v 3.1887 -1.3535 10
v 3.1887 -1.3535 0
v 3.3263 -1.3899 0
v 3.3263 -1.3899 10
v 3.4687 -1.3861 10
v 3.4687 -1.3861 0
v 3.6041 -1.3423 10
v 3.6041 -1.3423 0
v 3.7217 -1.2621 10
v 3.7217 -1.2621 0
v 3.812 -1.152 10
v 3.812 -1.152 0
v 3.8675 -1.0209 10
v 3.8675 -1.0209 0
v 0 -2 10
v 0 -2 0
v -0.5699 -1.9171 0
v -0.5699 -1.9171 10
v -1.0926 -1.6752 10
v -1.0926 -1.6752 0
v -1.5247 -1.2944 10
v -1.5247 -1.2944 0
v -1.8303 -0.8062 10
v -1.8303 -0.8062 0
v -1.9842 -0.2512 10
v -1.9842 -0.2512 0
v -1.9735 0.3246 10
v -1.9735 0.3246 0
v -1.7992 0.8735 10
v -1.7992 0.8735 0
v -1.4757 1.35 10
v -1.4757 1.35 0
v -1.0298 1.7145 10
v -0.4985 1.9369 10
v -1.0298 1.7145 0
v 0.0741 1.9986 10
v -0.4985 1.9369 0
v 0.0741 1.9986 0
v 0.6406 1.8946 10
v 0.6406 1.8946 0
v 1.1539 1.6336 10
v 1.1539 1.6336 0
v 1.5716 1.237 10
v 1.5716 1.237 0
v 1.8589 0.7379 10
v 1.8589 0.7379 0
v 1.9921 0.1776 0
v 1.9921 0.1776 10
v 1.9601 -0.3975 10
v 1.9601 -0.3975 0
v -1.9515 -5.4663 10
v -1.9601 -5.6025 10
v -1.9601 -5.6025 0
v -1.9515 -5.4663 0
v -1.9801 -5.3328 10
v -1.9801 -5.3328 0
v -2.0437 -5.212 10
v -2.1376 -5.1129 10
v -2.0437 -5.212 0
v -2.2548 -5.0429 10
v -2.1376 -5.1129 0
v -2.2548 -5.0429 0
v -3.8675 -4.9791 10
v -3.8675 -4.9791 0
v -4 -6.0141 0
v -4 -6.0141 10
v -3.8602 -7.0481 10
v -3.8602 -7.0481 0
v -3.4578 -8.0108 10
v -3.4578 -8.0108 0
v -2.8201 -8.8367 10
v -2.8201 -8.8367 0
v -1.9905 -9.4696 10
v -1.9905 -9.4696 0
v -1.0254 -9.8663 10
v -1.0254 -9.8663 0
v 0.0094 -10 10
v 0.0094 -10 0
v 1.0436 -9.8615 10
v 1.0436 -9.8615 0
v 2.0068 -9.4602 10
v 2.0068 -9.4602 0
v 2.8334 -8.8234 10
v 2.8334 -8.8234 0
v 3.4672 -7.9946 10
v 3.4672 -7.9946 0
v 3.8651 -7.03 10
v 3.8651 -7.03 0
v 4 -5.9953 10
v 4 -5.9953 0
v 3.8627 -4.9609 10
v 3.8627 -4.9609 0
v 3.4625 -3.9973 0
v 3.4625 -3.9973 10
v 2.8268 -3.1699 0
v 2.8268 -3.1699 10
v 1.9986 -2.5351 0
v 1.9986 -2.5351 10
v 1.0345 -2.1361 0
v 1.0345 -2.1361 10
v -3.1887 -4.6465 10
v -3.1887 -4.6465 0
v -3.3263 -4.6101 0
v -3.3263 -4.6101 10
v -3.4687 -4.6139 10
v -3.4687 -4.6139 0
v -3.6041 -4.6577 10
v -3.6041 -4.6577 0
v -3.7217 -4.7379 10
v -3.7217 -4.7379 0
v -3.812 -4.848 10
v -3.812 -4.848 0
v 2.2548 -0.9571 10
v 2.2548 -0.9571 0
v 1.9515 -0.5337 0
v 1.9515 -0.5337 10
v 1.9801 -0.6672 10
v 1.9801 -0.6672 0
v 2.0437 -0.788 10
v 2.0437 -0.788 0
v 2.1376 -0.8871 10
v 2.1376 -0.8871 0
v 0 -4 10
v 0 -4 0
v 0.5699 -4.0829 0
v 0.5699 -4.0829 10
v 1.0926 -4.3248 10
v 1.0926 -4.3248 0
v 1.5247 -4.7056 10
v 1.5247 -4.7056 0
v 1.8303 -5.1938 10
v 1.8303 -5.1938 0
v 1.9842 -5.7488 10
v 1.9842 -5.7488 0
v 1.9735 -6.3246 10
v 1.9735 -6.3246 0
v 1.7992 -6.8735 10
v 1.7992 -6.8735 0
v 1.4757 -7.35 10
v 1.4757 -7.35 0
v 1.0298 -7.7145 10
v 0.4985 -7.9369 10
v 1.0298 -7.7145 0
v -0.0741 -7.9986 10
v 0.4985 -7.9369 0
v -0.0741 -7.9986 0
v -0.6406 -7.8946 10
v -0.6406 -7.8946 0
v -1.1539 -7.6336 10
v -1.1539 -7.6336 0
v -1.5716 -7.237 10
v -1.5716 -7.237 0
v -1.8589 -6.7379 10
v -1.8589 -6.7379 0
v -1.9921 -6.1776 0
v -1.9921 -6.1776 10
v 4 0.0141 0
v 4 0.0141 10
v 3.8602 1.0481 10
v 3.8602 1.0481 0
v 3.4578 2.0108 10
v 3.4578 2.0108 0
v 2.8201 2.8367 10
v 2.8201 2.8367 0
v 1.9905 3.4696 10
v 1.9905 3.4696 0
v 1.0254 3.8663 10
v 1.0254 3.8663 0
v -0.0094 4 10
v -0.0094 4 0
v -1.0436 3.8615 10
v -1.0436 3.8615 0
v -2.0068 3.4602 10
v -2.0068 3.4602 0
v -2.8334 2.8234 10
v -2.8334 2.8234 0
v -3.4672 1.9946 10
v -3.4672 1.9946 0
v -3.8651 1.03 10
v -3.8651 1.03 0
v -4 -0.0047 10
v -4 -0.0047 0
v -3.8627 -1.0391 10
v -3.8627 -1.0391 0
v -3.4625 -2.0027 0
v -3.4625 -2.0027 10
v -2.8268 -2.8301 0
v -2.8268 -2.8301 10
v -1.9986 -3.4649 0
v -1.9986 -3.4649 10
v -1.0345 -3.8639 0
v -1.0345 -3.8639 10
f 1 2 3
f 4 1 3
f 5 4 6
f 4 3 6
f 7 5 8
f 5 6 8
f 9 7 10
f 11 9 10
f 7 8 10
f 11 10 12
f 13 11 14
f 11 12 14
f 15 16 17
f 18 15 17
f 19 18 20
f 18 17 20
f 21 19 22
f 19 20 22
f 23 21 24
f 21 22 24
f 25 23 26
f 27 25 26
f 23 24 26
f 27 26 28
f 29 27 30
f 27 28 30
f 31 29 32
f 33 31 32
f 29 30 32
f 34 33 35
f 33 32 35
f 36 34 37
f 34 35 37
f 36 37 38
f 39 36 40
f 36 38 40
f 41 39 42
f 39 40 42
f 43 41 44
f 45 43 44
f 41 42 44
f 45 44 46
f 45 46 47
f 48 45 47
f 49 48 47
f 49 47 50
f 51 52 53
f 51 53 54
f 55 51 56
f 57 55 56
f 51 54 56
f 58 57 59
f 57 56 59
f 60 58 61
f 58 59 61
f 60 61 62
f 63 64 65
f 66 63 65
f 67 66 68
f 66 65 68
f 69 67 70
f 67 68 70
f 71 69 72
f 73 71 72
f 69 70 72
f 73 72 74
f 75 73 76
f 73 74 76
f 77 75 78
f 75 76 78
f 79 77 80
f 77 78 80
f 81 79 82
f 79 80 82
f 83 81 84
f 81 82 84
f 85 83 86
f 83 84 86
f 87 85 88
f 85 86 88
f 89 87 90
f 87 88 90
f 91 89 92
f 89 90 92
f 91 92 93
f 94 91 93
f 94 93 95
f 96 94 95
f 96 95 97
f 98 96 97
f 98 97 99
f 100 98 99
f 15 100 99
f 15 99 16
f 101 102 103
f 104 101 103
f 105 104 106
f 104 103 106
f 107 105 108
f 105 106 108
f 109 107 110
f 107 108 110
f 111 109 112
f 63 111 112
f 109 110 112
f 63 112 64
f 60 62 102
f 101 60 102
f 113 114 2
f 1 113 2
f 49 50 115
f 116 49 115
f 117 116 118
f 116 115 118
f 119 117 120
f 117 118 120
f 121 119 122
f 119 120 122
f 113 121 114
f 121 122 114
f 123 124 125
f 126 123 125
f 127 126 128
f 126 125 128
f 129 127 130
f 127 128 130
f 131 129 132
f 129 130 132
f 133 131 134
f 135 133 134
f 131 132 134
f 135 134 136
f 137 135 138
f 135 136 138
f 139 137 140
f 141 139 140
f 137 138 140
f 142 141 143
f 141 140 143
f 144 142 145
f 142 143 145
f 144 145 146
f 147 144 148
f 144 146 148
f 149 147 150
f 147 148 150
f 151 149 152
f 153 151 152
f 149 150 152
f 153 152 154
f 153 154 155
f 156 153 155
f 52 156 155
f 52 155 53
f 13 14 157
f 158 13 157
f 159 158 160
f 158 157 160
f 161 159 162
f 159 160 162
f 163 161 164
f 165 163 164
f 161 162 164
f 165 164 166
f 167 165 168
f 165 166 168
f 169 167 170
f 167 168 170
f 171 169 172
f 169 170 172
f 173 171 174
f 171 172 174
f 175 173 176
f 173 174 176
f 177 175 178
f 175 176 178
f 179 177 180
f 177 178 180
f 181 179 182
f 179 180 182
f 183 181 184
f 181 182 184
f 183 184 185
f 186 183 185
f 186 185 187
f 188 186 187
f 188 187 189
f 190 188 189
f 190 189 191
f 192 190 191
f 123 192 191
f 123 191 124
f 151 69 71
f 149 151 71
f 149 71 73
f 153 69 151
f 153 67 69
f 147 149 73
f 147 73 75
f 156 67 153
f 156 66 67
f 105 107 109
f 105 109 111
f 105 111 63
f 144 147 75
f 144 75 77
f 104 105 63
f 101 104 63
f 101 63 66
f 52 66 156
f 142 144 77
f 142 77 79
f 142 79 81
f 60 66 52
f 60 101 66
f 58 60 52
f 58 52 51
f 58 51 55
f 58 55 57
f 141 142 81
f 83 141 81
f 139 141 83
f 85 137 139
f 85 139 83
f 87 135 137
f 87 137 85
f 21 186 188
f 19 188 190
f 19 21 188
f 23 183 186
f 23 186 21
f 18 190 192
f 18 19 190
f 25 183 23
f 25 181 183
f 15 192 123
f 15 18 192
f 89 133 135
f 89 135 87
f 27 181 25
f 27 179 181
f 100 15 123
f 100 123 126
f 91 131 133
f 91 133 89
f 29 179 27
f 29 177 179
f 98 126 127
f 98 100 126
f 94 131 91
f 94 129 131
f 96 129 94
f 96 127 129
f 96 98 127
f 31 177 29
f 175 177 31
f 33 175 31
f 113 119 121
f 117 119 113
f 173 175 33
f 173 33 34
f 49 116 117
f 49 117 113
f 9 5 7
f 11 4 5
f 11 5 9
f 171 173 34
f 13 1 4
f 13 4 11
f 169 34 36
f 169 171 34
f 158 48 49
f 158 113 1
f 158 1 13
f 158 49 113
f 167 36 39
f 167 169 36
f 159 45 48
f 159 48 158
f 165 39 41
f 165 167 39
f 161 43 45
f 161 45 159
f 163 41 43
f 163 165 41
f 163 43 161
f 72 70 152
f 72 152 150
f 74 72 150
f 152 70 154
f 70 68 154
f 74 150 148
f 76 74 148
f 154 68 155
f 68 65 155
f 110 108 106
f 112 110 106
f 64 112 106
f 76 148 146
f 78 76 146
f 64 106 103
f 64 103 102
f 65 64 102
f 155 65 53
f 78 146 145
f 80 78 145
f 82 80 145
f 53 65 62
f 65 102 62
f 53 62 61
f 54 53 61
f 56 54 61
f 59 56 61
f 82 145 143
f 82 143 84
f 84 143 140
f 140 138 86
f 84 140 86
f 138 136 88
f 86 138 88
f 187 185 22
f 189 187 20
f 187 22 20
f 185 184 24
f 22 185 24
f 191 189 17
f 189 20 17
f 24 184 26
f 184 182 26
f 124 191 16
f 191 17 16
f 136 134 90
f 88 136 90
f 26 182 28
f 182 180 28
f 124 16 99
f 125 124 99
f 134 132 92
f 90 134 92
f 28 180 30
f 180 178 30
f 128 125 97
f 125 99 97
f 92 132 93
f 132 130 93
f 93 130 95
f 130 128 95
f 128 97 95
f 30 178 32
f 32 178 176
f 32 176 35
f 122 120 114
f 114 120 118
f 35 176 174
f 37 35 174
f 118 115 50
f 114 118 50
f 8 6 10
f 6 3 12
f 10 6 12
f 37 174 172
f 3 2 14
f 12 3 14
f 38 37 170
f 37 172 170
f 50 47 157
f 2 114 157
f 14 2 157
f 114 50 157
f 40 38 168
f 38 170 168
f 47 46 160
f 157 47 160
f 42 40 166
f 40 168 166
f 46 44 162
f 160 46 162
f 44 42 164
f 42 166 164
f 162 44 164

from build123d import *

# Parameters (mm, degrees)
F1_DEPTH = 10


with BuildPart() as f1:
    # F0 (on Top) → F1 (new body)
    with BuildSketch(Plane.XY):
        with BuildLine():
            ThreePointArc((0, -2), (-1.26591, 1.548377), (1.960106, -0.397472))
            ThreePointArc((1.960106, -0.397472), (2.007714, -0.729789), (2.254767, -0.957092))
            Line((2.254767, -0.957092), (3.188722, -1.353532))
            ThreePointArc((3.188722, -1.353532), (3.604109, -1.342268), (3.867529, -1.020891))
            ThreePointArc((3.867529, -1.020891), (-2.440946, 3.168877), (0, -4))
            ThreePointArc((0, -4), (1.26591, -7.548377), (-1.960106, -5.602528))
            ThreePointArc((-1.960106, -5.602528), (-2.007714, -5.270211), (-2.254767, -5.042908))
            Line((-2.254767, -5.042908), (-3.188722, -4.646468))
            ThreePointArc((-3.188722, -4.646468), (-3.604109, -4.657732), (-3.867529, -4.979109))
            ThreePointArc((-3.867529, -4.979109), (2.440946, -9.168877), (0, -2))
        make_face()
    extrude(amount=F1_DEPTH)


solid = f1.part
